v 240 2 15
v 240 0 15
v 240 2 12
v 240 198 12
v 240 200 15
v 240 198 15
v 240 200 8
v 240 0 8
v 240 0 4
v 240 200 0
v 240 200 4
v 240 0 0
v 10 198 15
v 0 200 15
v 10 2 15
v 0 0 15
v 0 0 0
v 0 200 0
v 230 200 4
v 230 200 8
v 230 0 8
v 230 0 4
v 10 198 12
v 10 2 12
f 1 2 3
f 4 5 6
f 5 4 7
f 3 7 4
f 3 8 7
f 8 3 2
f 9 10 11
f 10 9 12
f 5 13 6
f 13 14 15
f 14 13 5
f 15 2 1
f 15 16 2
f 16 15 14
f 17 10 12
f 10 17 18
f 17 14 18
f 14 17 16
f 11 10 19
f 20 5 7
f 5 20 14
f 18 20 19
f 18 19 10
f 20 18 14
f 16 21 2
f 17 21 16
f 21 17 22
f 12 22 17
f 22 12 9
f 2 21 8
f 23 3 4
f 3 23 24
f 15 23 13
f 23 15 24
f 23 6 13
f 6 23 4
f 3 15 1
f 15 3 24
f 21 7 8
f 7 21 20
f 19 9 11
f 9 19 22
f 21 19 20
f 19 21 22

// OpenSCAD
difference()
{
  cube([240,200,15]);
  translate([10,2,12]) cube([240,196,5]);
  translate([230,-1,4]) cube([26,260,4]);
}
